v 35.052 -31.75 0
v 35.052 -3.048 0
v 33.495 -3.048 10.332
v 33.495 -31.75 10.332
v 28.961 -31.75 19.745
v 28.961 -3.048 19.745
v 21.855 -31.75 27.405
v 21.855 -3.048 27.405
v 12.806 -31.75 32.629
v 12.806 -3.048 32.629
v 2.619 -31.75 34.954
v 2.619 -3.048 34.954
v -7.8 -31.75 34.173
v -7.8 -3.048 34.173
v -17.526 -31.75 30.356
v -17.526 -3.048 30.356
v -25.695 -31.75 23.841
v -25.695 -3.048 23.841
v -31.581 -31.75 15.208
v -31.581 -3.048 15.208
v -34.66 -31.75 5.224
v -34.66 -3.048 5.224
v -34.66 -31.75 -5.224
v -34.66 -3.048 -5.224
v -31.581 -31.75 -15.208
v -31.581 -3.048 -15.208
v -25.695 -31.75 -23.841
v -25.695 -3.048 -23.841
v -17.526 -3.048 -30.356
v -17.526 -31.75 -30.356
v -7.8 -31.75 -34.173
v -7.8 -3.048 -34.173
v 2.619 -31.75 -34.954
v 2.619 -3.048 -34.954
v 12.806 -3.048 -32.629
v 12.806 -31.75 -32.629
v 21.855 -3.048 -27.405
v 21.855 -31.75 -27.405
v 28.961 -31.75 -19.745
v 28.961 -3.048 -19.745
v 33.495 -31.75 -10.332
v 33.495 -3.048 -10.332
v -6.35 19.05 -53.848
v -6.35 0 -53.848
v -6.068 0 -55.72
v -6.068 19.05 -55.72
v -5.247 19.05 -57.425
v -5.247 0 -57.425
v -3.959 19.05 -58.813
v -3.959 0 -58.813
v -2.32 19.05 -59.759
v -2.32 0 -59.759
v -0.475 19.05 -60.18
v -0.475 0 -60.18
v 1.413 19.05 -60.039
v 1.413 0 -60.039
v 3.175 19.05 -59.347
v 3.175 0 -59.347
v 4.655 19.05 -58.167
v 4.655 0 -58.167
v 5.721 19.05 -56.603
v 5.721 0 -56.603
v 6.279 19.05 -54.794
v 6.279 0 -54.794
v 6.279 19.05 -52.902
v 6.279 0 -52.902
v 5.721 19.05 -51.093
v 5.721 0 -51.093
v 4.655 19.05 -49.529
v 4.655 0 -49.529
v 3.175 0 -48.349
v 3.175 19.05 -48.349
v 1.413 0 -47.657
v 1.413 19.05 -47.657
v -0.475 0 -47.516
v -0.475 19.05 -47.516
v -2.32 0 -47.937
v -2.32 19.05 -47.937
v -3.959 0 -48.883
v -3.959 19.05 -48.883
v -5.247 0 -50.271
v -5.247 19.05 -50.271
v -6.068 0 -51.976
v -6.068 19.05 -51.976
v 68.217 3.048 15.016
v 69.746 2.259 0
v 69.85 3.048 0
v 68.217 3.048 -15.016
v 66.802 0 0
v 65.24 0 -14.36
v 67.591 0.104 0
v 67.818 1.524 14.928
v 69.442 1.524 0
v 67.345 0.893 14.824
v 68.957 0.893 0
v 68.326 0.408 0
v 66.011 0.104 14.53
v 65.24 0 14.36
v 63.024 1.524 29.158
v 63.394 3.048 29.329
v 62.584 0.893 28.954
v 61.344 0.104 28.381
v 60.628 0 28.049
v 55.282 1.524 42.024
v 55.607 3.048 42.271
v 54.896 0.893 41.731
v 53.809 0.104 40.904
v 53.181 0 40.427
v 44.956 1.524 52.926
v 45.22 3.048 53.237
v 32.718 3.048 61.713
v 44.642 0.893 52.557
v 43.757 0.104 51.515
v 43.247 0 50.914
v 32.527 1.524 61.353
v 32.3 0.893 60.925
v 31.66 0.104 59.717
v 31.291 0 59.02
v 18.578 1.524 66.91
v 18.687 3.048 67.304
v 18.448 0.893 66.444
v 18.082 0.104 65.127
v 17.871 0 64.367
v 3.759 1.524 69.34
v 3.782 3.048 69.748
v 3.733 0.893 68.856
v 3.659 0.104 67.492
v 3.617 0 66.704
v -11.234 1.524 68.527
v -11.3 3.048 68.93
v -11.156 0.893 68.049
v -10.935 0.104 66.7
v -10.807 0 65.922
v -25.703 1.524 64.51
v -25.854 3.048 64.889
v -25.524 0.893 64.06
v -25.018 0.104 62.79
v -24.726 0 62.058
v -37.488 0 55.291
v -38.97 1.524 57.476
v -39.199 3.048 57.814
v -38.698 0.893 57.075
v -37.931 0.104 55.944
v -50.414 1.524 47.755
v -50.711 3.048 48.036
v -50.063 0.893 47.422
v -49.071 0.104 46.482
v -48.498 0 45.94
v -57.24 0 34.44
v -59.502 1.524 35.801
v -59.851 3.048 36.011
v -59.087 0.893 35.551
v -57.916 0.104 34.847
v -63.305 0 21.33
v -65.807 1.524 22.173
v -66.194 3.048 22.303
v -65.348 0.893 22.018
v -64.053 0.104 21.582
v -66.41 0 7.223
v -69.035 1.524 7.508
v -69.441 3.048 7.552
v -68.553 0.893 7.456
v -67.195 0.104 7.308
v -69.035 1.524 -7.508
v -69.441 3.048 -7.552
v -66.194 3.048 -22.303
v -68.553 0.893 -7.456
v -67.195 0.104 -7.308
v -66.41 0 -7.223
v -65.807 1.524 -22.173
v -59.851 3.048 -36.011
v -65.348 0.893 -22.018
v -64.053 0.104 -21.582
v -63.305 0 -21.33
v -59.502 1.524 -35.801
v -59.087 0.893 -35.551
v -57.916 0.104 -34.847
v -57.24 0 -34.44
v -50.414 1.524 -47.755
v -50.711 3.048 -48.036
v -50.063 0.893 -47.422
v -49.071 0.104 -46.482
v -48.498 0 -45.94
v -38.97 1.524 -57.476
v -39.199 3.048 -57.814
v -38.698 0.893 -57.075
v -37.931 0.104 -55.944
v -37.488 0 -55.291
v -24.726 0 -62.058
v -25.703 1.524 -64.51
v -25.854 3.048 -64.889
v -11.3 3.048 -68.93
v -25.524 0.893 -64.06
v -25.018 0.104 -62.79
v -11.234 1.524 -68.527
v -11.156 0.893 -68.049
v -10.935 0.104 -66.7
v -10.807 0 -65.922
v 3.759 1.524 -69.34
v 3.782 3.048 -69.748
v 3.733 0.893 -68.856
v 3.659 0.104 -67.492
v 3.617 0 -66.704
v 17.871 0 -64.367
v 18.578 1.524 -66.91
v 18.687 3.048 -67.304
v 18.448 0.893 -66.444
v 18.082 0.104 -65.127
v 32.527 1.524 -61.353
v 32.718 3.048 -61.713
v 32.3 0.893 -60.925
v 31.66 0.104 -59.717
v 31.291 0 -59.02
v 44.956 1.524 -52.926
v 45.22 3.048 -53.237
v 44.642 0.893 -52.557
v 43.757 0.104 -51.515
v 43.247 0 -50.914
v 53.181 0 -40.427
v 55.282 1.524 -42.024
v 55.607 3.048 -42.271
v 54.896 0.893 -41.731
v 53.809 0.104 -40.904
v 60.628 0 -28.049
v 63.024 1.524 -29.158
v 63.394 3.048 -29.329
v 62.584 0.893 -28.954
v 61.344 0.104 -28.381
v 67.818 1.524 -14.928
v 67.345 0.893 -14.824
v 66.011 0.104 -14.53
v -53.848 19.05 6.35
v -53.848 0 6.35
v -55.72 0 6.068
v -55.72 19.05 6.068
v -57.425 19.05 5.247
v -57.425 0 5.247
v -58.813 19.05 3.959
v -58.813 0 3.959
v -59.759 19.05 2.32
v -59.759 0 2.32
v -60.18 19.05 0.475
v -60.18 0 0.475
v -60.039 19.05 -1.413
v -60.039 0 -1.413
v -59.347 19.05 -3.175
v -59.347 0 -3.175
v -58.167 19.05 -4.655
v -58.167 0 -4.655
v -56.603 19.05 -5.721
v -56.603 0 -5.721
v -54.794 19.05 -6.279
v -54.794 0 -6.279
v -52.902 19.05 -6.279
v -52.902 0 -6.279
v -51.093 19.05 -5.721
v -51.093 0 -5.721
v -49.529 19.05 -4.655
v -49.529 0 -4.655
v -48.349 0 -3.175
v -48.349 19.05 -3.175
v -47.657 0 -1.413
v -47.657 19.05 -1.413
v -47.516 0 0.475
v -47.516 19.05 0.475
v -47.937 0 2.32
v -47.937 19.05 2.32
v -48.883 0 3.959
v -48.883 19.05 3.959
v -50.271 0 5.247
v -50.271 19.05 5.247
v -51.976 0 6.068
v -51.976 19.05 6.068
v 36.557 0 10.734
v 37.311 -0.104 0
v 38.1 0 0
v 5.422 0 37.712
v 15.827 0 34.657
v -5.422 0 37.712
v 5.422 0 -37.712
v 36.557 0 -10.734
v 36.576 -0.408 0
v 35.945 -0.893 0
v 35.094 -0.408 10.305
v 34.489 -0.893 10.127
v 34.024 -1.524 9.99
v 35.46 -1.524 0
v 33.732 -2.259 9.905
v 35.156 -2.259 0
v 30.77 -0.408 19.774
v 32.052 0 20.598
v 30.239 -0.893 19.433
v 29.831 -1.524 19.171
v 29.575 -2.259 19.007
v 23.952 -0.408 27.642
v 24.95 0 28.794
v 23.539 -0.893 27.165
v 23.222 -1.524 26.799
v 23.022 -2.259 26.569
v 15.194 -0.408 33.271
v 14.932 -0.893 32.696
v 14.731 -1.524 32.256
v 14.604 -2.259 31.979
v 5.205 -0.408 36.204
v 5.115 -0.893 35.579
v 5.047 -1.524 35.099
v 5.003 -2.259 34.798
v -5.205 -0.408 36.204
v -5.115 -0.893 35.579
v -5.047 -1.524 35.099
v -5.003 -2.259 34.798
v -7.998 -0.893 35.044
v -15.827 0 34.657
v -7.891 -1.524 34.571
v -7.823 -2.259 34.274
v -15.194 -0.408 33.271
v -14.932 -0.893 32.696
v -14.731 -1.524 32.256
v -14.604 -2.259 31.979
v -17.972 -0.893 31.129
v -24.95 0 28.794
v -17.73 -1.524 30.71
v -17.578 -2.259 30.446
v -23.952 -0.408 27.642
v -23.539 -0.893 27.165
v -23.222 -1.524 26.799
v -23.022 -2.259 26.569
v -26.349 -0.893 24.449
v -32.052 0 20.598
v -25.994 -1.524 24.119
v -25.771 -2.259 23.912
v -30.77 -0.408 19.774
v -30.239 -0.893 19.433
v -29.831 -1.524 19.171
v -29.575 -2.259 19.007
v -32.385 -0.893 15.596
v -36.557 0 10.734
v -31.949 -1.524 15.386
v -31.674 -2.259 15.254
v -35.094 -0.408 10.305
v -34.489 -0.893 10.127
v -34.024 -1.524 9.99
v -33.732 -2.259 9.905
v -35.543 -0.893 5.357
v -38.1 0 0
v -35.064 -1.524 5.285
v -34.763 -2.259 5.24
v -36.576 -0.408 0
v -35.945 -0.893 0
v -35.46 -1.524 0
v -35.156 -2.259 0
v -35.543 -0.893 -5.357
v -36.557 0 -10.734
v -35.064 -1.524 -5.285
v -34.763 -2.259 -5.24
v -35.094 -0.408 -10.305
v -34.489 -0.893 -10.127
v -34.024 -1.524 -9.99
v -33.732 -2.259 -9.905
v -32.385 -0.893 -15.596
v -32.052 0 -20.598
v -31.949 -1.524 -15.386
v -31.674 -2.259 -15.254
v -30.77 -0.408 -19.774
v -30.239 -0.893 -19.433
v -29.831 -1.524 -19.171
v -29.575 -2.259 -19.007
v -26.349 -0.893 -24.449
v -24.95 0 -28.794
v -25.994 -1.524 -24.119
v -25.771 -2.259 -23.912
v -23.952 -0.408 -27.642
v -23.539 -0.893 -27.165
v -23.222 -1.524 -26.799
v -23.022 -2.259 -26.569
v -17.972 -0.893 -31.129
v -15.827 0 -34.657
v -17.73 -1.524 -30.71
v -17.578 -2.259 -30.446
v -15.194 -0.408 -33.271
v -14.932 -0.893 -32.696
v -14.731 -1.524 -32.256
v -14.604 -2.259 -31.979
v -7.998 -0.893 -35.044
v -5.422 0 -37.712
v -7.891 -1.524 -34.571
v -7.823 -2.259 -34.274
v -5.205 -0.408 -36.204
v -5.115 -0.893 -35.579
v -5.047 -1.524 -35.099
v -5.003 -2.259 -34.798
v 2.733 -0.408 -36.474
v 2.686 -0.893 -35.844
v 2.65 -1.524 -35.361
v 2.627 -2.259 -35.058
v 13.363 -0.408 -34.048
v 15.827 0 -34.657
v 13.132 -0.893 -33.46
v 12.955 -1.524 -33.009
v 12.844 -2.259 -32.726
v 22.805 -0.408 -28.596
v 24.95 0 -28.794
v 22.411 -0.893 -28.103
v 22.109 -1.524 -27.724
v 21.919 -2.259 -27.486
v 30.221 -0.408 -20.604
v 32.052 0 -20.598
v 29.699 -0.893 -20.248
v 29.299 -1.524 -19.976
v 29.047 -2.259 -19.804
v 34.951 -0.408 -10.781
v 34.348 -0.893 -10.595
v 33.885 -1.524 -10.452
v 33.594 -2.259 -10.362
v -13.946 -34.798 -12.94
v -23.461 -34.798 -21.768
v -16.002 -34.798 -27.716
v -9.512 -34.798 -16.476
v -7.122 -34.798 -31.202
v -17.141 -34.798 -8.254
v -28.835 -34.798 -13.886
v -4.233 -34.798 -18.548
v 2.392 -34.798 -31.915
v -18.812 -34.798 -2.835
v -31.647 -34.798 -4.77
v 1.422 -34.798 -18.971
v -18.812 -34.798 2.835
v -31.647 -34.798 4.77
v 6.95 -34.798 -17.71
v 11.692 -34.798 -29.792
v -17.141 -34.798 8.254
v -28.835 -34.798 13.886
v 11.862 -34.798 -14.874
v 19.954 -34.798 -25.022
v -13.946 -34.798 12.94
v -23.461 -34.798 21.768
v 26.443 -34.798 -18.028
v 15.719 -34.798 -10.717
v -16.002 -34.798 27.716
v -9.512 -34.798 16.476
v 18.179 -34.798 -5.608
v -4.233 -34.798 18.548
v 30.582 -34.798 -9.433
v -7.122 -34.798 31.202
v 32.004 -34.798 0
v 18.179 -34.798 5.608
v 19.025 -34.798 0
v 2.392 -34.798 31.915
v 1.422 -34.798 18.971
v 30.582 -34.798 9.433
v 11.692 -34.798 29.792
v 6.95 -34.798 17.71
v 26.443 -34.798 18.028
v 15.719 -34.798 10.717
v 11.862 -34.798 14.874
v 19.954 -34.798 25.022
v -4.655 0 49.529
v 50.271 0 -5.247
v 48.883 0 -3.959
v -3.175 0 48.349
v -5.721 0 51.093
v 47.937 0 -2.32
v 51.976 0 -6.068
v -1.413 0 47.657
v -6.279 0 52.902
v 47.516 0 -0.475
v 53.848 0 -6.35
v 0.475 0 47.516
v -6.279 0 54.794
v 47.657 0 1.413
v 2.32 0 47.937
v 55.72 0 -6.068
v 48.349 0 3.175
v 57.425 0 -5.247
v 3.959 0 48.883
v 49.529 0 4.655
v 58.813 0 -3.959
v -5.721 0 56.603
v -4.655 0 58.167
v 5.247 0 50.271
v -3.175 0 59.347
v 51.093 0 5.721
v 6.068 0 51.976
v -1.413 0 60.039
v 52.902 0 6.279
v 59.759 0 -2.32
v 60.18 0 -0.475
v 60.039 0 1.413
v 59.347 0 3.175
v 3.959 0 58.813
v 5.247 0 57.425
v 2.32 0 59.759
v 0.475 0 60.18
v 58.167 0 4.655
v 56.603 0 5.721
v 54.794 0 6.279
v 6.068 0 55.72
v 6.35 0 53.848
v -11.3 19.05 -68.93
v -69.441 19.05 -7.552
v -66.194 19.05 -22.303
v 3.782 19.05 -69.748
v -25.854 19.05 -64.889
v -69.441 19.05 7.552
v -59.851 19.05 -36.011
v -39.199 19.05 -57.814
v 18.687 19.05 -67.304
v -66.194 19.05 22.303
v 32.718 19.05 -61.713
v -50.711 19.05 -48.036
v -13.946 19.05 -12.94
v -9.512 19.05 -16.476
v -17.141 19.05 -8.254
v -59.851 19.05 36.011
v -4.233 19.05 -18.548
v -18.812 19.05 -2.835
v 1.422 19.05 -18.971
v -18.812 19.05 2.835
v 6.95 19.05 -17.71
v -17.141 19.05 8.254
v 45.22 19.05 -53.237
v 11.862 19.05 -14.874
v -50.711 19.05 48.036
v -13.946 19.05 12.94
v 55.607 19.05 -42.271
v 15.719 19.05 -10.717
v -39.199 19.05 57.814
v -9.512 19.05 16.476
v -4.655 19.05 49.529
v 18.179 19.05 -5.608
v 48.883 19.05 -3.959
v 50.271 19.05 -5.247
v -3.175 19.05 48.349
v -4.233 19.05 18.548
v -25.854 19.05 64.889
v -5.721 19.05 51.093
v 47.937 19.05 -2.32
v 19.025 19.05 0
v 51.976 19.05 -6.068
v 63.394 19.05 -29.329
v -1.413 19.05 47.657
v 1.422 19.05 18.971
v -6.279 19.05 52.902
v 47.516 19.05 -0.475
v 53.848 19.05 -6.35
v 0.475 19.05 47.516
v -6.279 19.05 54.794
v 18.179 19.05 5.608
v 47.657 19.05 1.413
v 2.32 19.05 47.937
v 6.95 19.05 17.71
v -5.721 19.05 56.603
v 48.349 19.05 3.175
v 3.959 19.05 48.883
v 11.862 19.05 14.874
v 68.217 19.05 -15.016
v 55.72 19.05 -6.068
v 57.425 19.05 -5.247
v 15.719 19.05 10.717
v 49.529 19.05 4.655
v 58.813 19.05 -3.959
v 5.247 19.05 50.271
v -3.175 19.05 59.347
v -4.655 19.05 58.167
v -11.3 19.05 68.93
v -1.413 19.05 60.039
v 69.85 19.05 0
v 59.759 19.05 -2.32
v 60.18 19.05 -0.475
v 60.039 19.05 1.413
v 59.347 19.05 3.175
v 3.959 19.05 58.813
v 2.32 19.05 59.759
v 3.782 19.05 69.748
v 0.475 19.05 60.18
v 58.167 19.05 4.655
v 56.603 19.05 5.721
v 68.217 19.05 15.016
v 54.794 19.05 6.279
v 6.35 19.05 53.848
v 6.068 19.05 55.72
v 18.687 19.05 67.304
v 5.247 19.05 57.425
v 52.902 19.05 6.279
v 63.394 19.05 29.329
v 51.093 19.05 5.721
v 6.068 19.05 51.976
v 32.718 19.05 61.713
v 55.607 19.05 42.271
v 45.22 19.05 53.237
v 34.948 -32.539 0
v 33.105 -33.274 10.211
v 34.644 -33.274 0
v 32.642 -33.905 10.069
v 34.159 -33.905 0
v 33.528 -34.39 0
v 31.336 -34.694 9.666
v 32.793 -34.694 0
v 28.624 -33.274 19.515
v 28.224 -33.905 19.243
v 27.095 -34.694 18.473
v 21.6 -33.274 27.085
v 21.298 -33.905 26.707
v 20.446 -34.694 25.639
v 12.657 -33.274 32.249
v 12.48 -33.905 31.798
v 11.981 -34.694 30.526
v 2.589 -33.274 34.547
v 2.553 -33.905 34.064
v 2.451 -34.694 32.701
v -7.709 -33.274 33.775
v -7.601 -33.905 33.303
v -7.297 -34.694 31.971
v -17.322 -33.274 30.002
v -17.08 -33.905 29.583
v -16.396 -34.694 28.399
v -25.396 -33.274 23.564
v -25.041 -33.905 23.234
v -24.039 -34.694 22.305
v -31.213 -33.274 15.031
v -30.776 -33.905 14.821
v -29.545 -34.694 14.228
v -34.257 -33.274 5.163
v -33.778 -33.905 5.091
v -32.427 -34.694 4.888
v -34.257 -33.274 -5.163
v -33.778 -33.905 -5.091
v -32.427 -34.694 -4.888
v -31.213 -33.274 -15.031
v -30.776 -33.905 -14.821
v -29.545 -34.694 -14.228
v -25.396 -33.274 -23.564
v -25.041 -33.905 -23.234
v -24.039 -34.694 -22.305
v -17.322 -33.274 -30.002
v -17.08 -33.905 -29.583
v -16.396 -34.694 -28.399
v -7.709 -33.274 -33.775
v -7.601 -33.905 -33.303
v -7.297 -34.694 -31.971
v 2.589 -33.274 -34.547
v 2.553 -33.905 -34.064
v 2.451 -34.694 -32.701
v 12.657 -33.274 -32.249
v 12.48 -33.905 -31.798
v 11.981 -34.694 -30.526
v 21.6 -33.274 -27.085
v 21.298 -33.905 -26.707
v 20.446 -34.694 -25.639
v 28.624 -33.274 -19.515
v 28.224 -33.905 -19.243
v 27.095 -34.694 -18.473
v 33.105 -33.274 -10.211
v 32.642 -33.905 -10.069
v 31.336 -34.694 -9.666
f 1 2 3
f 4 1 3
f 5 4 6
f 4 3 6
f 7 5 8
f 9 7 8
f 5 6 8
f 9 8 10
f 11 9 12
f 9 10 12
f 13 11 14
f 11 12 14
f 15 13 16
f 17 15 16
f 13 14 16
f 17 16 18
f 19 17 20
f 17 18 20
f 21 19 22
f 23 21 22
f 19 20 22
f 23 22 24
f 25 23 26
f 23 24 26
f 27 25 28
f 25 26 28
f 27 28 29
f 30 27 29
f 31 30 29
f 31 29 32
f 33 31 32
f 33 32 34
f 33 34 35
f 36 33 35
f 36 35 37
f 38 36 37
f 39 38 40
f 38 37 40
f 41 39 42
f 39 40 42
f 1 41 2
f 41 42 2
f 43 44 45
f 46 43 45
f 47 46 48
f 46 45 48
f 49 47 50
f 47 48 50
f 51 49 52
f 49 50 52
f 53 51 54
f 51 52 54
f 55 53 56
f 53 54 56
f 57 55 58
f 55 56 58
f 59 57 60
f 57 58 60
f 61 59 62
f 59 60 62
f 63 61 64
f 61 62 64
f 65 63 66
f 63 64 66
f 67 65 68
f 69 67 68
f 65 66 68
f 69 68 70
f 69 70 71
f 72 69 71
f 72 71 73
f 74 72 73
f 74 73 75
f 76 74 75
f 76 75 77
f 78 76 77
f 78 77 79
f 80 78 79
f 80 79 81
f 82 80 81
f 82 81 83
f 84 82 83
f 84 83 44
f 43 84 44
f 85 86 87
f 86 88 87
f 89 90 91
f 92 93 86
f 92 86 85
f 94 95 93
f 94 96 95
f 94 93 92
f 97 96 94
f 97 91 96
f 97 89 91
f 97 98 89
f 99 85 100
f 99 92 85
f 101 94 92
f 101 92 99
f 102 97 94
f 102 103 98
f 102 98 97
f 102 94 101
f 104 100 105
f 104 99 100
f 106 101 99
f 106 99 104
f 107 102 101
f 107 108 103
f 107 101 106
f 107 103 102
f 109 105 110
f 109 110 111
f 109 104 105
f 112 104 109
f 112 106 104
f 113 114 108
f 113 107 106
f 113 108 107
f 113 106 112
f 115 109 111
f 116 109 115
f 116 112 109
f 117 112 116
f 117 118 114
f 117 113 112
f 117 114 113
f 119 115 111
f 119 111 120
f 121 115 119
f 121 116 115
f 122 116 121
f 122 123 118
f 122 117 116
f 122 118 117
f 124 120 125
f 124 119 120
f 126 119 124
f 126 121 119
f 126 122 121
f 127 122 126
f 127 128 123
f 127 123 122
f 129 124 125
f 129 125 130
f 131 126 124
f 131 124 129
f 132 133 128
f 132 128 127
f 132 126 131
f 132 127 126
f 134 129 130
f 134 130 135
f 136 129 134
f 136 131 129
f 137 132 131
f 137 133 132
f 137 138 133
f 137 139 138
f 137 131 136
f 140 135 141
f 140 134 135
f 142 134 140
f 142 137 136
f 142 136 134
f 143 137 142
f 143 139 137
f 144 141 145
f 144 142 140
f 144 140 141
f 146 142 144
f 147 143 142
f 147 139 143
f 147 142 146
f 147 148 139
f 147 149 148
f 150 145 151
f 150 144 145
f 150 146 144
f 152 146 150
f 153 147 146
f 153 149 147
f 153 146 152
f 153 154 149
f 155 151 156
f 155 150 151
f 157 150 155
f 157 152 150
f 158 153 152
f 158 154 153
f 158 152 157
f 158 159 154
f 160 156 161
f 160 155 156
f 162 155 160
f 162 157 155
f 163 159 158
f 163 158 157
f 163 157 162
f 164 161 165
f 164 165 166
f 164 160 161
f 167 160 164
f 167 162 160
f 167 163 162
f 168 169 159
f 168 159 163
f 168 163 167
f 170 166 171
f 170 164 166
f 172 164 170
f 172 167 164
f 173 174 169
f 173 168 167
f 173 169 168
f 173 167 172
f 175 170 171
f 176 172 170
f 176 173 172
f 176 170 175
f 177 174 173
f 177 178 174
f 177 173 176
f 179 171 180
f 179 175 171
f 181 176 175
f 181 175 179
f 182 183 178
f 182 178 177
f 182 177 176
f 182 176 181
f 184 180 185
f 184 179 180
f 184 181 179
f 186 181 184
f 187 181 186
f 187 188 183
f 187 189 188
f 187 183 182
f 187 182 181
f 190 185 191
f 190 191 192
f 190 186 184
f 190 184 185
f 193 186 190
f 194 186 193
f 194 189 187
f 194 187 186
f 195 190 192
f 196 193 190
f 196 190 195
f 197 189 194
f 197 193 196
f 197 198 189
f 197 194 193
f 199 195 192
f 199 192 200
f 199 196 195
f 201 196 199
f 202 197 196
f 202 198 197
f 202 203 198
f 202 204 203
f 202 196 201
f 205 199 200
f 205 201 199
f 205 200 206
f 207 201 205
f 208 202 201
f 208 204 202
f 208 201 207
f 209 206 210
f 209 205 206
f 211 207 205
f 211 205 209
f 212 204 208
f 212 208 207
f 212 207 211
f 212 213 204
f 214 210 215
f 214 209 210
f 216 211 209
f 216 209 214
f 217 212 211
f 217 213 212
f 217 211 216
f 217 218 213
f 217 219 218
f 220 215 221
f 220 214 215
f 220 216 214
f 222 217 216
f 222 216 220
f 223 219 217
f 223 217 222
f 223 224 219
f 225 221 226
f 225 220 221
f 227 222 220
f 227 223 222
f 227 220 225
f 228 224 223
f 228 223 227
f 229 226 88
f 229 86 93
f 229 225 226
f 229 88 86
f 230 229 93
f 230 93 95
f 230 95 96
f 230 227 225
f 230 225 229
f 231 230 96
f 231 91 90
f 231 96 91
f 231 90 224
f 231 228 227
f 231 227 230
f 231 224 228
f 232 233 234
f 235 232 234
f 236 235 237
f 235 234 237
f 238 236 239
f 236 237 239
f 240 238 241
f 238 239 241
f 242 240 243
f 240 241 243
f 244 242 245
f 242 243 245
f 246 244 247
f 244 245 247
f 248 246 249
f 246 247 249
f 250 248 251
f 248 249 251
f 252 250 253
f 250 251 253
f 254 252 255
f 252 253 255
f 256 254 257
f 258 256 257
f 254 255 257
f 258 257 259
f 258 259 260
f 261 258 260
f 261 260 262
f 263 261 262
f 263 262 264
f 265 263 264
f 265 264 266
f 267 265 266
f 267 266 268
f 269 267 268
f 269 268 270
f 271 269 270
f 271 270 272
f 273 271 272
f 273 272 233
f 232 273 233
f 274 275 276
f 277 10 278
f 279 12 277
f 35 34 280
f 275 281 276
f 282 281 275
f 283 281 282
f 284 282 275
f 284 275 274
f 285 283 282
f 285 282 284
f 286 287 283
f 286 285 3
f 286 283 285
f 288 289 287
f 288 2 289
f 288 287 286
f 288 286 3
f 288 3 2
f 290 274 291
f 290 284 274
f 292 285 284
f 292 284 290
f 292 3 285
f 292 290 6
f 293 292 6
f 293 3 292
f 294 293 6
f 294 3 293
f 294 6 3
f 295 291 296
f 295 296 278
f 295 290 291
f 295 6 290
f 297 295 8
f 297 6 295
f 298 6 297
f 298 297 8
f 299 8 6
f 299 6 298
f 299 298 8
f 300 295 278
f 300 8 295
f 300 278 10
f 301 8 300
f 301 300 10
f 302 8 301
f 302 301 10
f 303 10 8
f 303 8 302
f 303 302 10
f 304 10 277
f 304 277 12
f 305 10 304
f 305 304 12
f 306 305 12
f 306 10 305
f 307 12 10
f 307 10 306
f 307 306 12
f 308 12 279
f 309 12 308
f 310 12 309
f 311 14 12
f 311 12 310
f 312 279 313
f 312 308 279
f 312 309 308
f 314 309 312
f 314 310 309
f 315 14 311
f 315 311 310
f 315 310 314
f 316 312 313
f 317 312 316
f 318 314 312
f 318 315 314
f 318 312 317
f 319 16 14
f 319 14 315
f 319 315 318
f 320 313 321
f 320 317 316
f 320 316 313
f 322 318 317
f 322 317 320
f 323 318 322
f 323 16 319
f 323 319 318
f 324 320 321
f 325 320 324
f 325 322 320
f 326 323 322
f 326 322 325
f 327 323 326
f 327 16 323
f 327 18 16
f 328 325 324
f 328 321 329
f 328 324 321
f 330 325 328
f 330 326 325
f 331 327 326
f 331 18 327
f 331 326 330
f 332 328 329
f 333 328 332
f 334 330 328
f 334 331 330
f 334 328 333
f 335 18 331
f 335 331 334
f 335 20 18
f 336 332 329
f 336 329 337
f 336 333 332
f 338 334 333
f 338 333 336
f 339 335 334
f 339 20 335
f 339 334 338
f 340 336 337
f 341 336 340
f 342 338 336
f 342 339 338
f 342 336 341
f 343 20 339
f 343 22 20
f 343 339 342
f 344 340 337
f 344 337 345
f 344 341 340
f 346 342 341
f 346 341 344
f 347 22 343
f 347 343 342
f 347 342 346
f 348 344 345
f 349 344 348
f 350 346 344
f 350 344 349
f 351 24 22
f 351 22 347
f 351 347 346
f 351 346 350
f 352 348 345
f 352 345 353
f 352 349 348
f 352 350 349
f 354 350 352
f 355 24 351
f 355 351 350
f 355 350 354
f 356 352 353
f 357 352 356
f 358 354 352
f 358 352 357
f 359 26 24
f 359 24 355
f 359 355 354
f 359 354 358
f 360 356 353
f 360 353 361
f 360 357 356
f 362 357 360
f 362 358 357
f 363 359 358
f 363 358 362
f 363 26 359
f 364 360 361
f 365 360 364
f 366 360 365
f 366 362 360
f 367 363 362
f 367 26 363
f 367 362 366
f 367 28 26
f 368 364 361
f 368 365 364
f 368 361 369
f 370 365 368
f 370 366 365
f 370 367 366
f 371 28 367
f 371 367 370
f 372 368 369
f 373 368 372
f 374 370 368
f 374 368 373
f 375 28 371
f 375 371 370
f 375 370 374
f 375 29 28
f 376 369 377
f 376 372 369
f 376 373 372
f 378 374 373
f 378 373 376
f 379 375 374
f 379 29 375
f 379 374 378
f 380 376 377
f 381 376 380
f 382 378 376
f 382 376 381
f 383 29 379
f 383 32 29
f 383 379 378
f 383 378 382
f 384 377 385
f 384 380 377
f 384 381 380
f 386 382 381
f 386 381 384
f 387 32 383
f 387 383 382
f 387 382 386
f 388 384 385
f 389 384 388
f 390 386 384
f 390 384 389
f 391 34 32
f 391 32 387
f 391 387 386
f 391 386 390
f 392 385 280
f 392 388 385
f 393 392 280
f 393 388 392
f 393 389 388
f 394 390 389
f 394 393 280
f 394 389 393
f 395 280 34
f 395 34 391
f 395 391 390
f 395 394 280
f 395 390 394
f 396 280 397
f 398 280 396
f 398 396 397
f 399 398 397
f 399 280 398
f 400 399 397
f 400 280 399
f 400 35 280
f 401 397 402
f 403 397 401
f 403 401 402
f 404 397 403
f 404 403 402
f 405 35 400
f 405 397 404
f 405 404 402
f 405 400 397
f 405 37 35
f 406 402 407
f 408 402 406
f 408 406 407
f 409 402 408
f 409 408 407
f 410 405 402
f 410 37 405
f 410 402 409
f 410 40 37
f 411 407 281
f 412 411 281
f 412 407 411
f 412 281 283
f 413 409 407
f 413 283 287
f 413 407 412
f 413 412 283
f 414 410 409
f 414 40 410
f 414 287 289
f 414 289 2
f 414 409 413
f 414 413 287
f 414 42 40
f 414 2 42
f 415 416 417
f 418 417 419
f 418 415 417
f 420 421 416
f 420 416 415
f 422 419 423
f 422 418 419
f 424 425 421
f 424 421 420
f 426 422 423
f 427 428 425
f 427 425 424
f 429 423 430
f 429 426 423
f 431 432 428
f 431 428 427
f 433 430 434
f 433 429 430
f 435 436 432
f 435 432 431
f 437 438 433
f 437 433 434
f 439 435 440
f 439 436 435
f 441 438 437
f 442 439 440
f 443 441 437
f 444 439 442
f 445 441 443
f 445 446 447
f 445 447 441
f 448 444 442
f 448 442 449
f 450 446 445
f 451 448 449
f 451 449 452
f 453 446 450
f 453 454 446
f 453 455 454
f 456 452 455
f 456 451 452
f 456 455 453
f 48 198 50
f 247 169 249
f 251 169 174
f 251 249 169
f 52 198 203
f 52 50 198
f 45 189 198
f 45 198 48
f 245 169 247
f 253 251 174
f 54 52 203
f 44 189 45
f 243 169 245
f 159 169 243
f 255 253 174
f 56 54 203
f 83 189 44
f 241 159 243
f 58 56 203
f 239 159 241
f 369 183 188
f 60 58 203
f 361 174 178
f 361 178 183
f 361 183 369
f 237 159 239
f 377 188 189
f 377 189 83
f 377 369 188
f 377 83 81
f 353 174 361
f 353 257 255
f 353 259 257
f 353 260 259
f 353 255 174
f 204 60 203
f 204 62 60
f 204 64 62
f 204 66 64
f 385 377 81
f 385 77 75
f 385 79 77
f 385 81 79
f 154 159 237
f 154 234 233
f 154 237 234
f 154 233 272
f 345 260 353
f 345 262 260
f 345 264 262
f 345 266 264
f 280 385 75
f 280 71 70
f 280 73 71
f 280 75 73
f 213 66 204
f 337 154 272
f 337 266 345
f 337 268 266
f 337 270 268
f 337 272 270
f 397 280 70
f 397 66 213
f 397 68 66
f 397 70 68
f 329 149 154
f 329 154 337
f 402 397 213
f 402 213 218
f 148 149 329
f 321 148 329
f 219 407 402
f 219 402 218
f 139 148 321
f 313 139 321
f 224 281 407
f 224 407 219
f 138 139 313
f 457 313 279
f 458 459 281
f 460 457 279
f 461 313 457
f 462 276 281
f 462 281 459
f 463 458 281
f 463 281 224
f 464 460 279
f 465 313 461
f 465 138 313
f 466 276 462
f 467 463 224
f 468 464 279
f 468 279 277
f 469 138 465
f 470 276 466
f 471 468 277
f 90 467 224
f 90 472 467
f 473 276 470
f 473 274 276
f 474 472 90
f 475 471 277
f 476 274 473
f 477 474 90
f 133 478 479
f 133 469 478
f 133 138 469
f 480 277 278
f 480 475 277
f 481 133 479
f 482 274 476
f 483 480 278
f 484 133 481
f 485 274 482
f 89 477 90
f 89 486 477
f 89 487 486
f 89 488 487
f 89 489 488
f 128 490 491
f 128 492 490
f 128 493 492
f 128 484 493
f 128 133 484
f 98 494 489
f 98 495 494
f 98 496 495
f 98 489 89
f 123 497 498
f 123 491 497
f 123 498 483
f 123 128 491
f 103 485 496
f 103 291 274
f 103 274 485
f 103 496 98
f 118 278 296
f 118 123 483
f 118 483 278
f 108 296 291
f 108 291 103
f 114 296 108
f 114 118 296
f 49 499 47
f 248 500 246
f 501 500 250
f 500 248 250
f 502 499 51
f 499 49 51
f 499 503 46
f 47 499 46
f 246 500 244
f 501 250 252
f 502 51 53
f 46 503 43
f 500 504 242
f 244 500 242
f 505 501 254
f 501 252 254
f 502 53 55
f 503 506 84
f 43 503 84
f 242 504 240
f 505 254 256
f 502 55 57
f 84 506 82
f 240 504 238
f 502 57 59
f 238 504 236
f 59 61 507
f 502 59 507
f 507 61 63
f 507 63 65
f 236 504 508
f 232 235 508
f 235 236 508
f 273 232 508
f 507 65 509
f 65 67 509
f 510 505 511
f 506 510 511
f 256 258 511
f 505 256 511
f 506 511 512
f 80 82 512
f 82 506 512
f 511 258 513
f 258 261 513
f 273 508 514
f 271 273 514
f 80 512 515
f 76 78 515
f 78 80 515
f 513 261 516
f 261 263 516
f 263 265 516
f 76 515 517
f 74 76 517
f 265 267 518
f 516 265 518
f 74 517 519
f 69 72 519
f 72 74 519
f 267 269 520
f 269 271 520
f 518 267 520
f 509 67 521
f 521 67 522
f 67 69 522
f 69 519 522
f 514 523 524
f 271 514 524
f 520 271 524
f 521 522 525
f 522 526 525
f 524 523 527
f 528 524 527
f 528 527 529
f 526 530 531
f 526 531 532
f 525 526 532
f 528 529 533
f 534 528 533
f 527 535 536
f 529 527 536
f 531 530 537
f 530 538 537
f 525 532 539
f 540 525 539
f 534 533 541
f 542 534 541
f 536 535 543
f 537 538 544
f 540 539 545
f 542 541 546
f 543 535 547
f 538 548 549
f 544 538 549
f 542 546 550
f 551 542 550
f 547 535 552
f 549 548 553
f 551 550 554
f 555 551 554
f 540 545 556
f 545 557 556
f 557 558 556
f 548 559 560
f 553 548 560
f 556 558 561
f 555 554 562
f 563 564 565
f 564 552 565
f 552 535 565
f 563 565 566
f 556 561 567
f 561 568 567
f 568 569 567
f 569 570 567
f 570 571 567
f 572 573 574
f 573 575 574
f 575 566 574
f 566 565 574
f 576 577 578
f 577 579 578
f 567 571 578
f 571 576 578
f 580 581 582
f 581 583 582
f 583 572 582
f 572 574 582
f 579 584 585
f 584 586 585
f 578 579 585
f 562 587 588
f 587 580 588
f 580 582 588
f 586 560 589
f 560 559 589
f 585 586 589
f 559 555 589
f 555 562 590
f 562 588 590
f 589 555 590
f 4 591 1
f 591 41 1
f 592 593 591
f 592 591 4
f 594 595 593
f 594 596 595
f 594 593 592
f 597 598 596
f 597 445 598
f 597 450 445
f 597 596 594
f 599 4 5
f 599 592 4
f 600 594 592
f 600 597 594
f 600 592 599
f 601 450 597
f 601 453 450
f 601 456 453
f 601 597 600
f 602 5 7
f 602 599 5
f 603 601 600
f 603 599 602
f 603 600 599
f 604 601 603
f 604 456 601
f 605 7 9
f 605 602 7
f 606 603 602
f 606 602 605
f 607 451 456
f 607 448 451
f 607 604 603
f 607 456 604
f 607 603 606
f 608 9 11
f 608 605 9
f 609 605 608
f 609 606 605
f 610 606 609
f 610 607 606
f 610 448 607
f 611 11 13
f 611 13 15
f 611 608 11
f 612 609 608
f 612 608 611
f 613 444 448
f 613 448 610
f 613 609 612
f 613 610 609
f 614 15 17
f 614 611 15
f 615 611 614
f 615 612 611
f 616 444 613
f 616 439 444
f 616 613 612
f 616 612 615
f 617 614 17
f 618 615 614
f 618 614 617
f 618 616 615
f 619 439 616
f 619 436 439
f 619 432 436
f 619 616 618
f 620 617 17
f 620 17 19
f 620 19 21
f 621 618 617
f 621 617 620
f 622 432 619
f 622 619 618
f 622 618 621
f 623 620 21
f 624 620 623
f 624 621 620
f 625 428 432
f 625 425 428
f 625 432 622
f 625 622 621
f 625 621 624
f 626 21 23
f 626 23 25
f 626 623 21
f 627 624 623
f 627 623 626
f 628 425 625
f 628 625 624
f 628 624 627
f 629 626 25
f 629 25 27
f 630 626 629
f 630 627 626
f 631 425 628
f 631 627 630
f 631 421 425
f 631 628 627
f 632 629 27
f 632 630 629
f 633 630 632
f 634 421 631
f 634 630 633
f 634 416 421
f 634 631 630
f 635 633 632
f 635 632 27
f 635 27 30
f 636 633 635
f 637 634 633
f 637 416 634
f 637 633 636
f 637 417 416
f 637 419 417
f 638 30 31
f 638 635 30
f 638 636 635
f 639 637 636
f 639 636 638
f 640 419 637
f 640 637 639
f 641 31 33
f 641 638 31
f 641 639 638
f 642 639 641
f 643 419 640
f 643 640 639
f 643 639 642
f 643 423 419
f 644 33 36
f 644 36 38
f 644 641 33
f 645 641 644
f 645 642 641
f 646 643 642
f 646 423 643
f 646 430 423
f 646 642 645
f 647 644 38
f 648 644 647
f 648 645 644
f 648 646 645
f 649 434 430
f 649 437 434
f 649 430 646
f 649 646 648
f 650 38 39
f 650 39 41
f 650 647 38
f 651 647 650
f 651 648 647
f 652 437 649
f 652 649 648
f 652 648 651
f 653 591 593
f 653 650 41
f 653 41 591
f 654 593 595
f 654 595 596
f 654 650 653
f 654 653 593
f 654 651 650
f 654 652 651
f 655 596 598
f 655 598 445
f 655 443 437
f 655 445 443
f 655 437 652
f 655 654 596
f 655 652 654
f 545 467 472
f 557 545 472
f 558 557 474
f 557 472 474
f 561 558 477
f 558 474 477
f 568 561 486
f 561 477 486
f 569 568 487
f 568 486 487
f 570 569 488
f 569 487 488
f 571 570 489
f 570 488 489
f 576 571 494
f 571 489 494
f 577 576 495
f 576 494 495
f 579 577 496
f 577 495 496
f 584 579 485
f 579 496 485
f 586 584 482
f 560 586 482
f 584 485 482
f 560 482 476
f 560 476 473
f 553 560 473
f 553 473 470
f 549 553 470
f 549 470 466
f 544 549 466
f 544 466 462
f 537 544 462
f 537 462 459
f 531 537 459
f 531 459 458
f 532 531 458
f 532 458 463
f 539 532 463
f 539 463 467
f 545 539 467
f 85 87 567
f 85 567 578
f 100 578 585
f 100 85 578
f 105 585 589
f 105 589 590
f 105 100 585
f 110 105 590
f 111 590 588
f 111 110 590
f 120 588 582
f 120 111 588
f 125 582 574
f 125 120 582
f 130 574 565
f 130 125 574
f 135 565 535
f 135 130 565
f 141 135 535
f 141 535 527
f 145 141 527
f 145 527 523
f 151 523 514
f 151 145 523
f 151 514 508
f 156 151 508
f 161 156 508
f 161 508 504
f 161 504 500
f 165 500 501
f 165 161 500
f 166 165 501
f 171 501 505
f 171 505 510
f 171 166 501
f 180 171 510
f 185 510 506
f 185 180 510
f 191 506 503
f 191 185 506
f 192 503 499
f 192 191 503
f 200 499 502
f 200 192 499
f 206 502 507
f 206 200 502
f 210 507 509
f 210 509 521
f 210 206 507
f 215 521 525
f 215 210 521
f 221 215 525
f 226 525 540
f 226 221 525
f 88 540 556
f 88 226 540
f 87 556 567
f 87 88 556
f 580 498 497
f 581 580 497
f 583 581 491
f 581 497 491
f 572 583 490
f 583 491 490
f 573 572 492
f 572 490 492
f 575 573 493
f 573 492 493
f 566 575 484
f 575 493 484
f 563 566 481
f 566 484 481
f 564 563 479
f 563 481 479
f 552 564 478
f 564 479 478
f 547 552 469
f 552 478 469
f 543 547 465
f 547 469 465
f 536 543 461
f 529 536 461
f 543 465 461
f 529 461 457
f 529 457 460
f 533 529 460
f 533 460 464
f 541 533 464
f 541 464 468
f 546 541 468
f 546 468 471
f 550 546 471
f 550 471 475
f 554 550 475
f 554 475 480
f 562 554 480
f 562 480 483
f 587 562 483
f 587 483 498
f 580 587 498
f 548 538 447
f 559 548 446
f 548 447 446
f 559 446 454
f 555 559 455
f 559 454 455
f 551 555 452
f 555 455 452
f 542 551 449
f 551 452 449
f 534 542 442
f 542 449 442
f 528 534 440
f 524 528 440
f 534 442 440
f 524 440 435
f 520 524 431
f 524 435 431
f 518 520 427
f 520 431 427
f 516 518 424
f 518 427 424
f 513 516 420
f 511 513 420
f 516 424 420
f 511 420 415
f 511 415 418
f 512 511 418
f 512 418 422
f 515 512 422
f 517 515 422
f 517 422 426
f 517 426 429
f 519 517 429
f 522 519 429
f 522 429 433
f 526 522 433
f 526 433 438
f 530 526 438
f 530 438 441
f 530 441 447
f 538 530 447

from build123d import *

# Parameters (mm, degrees)
F0_R            = 69.85
F1_DEPTH        = 19.05
F2_R            = 35.052
F3_DEPTH        = 34.798
F4_R            = 19.0246
F5_DEPTH        = 53.849
F6_R            = 6.35
F7_DEPTH        = 19.051
F7_COPIES_COUNT = 4
F8_R            = 3.048


# Not quite as in the source:
# - a pattern or mirror of a feature is missing from the dataset's text; its kind, count and spacing are read off the source's solid


with BuildPart() as f1:
    # F0 (on Front) → F1 (new body)
    with BuildSketch(Plane.XZ):
        Circle(F0_R)
    extrude(amount=-F1_DEPTH)

    # F2 (on face) → F3 (join)
    with BuildSketch(Plane.XZ):
        Circle(F2_R)
    extrude(amount=F3_DEPTH)

    # F4 (on face) → F5 (cut, through all)
    with BuildSketch(Plane.XZ.offset(34.798)):
        Circle(F4_R)
    extrude(amount=-F5_DEPTH, mode=Mode.SUBTRACT)

    # F6 (on face) → F7 (cut, through all)
    with BuildSketch(Plane.XZ):
        with Locations((0, 53.848)):
            Circle(F6_R)
    f7 = extrude(amount=-F7_DEPTH, mode=Mode.SUBTRACT)

    # F7_copies: F7 ×4 about axis
    f7_copies_axis = Axis((0, 0, 0), (0, 1, 0))
    for i in range(1, F7_COPIES_COUNT):
        add(f7.rotate(f7_copies_axis, i * 360 / F7_COPIES_COUNT), mode=Mode.SUBTRACT)

    # F8
    f8_edges = [f1.edges().sort_by_distance(p)[0] for p in [
        (-35.052, -34.798, 0),
        (-35.052, 0, 0),
        (-69.85, 0, 0),
    ]]
    fillet(f8_edges, radius=F8_R)


solid = f1.part
